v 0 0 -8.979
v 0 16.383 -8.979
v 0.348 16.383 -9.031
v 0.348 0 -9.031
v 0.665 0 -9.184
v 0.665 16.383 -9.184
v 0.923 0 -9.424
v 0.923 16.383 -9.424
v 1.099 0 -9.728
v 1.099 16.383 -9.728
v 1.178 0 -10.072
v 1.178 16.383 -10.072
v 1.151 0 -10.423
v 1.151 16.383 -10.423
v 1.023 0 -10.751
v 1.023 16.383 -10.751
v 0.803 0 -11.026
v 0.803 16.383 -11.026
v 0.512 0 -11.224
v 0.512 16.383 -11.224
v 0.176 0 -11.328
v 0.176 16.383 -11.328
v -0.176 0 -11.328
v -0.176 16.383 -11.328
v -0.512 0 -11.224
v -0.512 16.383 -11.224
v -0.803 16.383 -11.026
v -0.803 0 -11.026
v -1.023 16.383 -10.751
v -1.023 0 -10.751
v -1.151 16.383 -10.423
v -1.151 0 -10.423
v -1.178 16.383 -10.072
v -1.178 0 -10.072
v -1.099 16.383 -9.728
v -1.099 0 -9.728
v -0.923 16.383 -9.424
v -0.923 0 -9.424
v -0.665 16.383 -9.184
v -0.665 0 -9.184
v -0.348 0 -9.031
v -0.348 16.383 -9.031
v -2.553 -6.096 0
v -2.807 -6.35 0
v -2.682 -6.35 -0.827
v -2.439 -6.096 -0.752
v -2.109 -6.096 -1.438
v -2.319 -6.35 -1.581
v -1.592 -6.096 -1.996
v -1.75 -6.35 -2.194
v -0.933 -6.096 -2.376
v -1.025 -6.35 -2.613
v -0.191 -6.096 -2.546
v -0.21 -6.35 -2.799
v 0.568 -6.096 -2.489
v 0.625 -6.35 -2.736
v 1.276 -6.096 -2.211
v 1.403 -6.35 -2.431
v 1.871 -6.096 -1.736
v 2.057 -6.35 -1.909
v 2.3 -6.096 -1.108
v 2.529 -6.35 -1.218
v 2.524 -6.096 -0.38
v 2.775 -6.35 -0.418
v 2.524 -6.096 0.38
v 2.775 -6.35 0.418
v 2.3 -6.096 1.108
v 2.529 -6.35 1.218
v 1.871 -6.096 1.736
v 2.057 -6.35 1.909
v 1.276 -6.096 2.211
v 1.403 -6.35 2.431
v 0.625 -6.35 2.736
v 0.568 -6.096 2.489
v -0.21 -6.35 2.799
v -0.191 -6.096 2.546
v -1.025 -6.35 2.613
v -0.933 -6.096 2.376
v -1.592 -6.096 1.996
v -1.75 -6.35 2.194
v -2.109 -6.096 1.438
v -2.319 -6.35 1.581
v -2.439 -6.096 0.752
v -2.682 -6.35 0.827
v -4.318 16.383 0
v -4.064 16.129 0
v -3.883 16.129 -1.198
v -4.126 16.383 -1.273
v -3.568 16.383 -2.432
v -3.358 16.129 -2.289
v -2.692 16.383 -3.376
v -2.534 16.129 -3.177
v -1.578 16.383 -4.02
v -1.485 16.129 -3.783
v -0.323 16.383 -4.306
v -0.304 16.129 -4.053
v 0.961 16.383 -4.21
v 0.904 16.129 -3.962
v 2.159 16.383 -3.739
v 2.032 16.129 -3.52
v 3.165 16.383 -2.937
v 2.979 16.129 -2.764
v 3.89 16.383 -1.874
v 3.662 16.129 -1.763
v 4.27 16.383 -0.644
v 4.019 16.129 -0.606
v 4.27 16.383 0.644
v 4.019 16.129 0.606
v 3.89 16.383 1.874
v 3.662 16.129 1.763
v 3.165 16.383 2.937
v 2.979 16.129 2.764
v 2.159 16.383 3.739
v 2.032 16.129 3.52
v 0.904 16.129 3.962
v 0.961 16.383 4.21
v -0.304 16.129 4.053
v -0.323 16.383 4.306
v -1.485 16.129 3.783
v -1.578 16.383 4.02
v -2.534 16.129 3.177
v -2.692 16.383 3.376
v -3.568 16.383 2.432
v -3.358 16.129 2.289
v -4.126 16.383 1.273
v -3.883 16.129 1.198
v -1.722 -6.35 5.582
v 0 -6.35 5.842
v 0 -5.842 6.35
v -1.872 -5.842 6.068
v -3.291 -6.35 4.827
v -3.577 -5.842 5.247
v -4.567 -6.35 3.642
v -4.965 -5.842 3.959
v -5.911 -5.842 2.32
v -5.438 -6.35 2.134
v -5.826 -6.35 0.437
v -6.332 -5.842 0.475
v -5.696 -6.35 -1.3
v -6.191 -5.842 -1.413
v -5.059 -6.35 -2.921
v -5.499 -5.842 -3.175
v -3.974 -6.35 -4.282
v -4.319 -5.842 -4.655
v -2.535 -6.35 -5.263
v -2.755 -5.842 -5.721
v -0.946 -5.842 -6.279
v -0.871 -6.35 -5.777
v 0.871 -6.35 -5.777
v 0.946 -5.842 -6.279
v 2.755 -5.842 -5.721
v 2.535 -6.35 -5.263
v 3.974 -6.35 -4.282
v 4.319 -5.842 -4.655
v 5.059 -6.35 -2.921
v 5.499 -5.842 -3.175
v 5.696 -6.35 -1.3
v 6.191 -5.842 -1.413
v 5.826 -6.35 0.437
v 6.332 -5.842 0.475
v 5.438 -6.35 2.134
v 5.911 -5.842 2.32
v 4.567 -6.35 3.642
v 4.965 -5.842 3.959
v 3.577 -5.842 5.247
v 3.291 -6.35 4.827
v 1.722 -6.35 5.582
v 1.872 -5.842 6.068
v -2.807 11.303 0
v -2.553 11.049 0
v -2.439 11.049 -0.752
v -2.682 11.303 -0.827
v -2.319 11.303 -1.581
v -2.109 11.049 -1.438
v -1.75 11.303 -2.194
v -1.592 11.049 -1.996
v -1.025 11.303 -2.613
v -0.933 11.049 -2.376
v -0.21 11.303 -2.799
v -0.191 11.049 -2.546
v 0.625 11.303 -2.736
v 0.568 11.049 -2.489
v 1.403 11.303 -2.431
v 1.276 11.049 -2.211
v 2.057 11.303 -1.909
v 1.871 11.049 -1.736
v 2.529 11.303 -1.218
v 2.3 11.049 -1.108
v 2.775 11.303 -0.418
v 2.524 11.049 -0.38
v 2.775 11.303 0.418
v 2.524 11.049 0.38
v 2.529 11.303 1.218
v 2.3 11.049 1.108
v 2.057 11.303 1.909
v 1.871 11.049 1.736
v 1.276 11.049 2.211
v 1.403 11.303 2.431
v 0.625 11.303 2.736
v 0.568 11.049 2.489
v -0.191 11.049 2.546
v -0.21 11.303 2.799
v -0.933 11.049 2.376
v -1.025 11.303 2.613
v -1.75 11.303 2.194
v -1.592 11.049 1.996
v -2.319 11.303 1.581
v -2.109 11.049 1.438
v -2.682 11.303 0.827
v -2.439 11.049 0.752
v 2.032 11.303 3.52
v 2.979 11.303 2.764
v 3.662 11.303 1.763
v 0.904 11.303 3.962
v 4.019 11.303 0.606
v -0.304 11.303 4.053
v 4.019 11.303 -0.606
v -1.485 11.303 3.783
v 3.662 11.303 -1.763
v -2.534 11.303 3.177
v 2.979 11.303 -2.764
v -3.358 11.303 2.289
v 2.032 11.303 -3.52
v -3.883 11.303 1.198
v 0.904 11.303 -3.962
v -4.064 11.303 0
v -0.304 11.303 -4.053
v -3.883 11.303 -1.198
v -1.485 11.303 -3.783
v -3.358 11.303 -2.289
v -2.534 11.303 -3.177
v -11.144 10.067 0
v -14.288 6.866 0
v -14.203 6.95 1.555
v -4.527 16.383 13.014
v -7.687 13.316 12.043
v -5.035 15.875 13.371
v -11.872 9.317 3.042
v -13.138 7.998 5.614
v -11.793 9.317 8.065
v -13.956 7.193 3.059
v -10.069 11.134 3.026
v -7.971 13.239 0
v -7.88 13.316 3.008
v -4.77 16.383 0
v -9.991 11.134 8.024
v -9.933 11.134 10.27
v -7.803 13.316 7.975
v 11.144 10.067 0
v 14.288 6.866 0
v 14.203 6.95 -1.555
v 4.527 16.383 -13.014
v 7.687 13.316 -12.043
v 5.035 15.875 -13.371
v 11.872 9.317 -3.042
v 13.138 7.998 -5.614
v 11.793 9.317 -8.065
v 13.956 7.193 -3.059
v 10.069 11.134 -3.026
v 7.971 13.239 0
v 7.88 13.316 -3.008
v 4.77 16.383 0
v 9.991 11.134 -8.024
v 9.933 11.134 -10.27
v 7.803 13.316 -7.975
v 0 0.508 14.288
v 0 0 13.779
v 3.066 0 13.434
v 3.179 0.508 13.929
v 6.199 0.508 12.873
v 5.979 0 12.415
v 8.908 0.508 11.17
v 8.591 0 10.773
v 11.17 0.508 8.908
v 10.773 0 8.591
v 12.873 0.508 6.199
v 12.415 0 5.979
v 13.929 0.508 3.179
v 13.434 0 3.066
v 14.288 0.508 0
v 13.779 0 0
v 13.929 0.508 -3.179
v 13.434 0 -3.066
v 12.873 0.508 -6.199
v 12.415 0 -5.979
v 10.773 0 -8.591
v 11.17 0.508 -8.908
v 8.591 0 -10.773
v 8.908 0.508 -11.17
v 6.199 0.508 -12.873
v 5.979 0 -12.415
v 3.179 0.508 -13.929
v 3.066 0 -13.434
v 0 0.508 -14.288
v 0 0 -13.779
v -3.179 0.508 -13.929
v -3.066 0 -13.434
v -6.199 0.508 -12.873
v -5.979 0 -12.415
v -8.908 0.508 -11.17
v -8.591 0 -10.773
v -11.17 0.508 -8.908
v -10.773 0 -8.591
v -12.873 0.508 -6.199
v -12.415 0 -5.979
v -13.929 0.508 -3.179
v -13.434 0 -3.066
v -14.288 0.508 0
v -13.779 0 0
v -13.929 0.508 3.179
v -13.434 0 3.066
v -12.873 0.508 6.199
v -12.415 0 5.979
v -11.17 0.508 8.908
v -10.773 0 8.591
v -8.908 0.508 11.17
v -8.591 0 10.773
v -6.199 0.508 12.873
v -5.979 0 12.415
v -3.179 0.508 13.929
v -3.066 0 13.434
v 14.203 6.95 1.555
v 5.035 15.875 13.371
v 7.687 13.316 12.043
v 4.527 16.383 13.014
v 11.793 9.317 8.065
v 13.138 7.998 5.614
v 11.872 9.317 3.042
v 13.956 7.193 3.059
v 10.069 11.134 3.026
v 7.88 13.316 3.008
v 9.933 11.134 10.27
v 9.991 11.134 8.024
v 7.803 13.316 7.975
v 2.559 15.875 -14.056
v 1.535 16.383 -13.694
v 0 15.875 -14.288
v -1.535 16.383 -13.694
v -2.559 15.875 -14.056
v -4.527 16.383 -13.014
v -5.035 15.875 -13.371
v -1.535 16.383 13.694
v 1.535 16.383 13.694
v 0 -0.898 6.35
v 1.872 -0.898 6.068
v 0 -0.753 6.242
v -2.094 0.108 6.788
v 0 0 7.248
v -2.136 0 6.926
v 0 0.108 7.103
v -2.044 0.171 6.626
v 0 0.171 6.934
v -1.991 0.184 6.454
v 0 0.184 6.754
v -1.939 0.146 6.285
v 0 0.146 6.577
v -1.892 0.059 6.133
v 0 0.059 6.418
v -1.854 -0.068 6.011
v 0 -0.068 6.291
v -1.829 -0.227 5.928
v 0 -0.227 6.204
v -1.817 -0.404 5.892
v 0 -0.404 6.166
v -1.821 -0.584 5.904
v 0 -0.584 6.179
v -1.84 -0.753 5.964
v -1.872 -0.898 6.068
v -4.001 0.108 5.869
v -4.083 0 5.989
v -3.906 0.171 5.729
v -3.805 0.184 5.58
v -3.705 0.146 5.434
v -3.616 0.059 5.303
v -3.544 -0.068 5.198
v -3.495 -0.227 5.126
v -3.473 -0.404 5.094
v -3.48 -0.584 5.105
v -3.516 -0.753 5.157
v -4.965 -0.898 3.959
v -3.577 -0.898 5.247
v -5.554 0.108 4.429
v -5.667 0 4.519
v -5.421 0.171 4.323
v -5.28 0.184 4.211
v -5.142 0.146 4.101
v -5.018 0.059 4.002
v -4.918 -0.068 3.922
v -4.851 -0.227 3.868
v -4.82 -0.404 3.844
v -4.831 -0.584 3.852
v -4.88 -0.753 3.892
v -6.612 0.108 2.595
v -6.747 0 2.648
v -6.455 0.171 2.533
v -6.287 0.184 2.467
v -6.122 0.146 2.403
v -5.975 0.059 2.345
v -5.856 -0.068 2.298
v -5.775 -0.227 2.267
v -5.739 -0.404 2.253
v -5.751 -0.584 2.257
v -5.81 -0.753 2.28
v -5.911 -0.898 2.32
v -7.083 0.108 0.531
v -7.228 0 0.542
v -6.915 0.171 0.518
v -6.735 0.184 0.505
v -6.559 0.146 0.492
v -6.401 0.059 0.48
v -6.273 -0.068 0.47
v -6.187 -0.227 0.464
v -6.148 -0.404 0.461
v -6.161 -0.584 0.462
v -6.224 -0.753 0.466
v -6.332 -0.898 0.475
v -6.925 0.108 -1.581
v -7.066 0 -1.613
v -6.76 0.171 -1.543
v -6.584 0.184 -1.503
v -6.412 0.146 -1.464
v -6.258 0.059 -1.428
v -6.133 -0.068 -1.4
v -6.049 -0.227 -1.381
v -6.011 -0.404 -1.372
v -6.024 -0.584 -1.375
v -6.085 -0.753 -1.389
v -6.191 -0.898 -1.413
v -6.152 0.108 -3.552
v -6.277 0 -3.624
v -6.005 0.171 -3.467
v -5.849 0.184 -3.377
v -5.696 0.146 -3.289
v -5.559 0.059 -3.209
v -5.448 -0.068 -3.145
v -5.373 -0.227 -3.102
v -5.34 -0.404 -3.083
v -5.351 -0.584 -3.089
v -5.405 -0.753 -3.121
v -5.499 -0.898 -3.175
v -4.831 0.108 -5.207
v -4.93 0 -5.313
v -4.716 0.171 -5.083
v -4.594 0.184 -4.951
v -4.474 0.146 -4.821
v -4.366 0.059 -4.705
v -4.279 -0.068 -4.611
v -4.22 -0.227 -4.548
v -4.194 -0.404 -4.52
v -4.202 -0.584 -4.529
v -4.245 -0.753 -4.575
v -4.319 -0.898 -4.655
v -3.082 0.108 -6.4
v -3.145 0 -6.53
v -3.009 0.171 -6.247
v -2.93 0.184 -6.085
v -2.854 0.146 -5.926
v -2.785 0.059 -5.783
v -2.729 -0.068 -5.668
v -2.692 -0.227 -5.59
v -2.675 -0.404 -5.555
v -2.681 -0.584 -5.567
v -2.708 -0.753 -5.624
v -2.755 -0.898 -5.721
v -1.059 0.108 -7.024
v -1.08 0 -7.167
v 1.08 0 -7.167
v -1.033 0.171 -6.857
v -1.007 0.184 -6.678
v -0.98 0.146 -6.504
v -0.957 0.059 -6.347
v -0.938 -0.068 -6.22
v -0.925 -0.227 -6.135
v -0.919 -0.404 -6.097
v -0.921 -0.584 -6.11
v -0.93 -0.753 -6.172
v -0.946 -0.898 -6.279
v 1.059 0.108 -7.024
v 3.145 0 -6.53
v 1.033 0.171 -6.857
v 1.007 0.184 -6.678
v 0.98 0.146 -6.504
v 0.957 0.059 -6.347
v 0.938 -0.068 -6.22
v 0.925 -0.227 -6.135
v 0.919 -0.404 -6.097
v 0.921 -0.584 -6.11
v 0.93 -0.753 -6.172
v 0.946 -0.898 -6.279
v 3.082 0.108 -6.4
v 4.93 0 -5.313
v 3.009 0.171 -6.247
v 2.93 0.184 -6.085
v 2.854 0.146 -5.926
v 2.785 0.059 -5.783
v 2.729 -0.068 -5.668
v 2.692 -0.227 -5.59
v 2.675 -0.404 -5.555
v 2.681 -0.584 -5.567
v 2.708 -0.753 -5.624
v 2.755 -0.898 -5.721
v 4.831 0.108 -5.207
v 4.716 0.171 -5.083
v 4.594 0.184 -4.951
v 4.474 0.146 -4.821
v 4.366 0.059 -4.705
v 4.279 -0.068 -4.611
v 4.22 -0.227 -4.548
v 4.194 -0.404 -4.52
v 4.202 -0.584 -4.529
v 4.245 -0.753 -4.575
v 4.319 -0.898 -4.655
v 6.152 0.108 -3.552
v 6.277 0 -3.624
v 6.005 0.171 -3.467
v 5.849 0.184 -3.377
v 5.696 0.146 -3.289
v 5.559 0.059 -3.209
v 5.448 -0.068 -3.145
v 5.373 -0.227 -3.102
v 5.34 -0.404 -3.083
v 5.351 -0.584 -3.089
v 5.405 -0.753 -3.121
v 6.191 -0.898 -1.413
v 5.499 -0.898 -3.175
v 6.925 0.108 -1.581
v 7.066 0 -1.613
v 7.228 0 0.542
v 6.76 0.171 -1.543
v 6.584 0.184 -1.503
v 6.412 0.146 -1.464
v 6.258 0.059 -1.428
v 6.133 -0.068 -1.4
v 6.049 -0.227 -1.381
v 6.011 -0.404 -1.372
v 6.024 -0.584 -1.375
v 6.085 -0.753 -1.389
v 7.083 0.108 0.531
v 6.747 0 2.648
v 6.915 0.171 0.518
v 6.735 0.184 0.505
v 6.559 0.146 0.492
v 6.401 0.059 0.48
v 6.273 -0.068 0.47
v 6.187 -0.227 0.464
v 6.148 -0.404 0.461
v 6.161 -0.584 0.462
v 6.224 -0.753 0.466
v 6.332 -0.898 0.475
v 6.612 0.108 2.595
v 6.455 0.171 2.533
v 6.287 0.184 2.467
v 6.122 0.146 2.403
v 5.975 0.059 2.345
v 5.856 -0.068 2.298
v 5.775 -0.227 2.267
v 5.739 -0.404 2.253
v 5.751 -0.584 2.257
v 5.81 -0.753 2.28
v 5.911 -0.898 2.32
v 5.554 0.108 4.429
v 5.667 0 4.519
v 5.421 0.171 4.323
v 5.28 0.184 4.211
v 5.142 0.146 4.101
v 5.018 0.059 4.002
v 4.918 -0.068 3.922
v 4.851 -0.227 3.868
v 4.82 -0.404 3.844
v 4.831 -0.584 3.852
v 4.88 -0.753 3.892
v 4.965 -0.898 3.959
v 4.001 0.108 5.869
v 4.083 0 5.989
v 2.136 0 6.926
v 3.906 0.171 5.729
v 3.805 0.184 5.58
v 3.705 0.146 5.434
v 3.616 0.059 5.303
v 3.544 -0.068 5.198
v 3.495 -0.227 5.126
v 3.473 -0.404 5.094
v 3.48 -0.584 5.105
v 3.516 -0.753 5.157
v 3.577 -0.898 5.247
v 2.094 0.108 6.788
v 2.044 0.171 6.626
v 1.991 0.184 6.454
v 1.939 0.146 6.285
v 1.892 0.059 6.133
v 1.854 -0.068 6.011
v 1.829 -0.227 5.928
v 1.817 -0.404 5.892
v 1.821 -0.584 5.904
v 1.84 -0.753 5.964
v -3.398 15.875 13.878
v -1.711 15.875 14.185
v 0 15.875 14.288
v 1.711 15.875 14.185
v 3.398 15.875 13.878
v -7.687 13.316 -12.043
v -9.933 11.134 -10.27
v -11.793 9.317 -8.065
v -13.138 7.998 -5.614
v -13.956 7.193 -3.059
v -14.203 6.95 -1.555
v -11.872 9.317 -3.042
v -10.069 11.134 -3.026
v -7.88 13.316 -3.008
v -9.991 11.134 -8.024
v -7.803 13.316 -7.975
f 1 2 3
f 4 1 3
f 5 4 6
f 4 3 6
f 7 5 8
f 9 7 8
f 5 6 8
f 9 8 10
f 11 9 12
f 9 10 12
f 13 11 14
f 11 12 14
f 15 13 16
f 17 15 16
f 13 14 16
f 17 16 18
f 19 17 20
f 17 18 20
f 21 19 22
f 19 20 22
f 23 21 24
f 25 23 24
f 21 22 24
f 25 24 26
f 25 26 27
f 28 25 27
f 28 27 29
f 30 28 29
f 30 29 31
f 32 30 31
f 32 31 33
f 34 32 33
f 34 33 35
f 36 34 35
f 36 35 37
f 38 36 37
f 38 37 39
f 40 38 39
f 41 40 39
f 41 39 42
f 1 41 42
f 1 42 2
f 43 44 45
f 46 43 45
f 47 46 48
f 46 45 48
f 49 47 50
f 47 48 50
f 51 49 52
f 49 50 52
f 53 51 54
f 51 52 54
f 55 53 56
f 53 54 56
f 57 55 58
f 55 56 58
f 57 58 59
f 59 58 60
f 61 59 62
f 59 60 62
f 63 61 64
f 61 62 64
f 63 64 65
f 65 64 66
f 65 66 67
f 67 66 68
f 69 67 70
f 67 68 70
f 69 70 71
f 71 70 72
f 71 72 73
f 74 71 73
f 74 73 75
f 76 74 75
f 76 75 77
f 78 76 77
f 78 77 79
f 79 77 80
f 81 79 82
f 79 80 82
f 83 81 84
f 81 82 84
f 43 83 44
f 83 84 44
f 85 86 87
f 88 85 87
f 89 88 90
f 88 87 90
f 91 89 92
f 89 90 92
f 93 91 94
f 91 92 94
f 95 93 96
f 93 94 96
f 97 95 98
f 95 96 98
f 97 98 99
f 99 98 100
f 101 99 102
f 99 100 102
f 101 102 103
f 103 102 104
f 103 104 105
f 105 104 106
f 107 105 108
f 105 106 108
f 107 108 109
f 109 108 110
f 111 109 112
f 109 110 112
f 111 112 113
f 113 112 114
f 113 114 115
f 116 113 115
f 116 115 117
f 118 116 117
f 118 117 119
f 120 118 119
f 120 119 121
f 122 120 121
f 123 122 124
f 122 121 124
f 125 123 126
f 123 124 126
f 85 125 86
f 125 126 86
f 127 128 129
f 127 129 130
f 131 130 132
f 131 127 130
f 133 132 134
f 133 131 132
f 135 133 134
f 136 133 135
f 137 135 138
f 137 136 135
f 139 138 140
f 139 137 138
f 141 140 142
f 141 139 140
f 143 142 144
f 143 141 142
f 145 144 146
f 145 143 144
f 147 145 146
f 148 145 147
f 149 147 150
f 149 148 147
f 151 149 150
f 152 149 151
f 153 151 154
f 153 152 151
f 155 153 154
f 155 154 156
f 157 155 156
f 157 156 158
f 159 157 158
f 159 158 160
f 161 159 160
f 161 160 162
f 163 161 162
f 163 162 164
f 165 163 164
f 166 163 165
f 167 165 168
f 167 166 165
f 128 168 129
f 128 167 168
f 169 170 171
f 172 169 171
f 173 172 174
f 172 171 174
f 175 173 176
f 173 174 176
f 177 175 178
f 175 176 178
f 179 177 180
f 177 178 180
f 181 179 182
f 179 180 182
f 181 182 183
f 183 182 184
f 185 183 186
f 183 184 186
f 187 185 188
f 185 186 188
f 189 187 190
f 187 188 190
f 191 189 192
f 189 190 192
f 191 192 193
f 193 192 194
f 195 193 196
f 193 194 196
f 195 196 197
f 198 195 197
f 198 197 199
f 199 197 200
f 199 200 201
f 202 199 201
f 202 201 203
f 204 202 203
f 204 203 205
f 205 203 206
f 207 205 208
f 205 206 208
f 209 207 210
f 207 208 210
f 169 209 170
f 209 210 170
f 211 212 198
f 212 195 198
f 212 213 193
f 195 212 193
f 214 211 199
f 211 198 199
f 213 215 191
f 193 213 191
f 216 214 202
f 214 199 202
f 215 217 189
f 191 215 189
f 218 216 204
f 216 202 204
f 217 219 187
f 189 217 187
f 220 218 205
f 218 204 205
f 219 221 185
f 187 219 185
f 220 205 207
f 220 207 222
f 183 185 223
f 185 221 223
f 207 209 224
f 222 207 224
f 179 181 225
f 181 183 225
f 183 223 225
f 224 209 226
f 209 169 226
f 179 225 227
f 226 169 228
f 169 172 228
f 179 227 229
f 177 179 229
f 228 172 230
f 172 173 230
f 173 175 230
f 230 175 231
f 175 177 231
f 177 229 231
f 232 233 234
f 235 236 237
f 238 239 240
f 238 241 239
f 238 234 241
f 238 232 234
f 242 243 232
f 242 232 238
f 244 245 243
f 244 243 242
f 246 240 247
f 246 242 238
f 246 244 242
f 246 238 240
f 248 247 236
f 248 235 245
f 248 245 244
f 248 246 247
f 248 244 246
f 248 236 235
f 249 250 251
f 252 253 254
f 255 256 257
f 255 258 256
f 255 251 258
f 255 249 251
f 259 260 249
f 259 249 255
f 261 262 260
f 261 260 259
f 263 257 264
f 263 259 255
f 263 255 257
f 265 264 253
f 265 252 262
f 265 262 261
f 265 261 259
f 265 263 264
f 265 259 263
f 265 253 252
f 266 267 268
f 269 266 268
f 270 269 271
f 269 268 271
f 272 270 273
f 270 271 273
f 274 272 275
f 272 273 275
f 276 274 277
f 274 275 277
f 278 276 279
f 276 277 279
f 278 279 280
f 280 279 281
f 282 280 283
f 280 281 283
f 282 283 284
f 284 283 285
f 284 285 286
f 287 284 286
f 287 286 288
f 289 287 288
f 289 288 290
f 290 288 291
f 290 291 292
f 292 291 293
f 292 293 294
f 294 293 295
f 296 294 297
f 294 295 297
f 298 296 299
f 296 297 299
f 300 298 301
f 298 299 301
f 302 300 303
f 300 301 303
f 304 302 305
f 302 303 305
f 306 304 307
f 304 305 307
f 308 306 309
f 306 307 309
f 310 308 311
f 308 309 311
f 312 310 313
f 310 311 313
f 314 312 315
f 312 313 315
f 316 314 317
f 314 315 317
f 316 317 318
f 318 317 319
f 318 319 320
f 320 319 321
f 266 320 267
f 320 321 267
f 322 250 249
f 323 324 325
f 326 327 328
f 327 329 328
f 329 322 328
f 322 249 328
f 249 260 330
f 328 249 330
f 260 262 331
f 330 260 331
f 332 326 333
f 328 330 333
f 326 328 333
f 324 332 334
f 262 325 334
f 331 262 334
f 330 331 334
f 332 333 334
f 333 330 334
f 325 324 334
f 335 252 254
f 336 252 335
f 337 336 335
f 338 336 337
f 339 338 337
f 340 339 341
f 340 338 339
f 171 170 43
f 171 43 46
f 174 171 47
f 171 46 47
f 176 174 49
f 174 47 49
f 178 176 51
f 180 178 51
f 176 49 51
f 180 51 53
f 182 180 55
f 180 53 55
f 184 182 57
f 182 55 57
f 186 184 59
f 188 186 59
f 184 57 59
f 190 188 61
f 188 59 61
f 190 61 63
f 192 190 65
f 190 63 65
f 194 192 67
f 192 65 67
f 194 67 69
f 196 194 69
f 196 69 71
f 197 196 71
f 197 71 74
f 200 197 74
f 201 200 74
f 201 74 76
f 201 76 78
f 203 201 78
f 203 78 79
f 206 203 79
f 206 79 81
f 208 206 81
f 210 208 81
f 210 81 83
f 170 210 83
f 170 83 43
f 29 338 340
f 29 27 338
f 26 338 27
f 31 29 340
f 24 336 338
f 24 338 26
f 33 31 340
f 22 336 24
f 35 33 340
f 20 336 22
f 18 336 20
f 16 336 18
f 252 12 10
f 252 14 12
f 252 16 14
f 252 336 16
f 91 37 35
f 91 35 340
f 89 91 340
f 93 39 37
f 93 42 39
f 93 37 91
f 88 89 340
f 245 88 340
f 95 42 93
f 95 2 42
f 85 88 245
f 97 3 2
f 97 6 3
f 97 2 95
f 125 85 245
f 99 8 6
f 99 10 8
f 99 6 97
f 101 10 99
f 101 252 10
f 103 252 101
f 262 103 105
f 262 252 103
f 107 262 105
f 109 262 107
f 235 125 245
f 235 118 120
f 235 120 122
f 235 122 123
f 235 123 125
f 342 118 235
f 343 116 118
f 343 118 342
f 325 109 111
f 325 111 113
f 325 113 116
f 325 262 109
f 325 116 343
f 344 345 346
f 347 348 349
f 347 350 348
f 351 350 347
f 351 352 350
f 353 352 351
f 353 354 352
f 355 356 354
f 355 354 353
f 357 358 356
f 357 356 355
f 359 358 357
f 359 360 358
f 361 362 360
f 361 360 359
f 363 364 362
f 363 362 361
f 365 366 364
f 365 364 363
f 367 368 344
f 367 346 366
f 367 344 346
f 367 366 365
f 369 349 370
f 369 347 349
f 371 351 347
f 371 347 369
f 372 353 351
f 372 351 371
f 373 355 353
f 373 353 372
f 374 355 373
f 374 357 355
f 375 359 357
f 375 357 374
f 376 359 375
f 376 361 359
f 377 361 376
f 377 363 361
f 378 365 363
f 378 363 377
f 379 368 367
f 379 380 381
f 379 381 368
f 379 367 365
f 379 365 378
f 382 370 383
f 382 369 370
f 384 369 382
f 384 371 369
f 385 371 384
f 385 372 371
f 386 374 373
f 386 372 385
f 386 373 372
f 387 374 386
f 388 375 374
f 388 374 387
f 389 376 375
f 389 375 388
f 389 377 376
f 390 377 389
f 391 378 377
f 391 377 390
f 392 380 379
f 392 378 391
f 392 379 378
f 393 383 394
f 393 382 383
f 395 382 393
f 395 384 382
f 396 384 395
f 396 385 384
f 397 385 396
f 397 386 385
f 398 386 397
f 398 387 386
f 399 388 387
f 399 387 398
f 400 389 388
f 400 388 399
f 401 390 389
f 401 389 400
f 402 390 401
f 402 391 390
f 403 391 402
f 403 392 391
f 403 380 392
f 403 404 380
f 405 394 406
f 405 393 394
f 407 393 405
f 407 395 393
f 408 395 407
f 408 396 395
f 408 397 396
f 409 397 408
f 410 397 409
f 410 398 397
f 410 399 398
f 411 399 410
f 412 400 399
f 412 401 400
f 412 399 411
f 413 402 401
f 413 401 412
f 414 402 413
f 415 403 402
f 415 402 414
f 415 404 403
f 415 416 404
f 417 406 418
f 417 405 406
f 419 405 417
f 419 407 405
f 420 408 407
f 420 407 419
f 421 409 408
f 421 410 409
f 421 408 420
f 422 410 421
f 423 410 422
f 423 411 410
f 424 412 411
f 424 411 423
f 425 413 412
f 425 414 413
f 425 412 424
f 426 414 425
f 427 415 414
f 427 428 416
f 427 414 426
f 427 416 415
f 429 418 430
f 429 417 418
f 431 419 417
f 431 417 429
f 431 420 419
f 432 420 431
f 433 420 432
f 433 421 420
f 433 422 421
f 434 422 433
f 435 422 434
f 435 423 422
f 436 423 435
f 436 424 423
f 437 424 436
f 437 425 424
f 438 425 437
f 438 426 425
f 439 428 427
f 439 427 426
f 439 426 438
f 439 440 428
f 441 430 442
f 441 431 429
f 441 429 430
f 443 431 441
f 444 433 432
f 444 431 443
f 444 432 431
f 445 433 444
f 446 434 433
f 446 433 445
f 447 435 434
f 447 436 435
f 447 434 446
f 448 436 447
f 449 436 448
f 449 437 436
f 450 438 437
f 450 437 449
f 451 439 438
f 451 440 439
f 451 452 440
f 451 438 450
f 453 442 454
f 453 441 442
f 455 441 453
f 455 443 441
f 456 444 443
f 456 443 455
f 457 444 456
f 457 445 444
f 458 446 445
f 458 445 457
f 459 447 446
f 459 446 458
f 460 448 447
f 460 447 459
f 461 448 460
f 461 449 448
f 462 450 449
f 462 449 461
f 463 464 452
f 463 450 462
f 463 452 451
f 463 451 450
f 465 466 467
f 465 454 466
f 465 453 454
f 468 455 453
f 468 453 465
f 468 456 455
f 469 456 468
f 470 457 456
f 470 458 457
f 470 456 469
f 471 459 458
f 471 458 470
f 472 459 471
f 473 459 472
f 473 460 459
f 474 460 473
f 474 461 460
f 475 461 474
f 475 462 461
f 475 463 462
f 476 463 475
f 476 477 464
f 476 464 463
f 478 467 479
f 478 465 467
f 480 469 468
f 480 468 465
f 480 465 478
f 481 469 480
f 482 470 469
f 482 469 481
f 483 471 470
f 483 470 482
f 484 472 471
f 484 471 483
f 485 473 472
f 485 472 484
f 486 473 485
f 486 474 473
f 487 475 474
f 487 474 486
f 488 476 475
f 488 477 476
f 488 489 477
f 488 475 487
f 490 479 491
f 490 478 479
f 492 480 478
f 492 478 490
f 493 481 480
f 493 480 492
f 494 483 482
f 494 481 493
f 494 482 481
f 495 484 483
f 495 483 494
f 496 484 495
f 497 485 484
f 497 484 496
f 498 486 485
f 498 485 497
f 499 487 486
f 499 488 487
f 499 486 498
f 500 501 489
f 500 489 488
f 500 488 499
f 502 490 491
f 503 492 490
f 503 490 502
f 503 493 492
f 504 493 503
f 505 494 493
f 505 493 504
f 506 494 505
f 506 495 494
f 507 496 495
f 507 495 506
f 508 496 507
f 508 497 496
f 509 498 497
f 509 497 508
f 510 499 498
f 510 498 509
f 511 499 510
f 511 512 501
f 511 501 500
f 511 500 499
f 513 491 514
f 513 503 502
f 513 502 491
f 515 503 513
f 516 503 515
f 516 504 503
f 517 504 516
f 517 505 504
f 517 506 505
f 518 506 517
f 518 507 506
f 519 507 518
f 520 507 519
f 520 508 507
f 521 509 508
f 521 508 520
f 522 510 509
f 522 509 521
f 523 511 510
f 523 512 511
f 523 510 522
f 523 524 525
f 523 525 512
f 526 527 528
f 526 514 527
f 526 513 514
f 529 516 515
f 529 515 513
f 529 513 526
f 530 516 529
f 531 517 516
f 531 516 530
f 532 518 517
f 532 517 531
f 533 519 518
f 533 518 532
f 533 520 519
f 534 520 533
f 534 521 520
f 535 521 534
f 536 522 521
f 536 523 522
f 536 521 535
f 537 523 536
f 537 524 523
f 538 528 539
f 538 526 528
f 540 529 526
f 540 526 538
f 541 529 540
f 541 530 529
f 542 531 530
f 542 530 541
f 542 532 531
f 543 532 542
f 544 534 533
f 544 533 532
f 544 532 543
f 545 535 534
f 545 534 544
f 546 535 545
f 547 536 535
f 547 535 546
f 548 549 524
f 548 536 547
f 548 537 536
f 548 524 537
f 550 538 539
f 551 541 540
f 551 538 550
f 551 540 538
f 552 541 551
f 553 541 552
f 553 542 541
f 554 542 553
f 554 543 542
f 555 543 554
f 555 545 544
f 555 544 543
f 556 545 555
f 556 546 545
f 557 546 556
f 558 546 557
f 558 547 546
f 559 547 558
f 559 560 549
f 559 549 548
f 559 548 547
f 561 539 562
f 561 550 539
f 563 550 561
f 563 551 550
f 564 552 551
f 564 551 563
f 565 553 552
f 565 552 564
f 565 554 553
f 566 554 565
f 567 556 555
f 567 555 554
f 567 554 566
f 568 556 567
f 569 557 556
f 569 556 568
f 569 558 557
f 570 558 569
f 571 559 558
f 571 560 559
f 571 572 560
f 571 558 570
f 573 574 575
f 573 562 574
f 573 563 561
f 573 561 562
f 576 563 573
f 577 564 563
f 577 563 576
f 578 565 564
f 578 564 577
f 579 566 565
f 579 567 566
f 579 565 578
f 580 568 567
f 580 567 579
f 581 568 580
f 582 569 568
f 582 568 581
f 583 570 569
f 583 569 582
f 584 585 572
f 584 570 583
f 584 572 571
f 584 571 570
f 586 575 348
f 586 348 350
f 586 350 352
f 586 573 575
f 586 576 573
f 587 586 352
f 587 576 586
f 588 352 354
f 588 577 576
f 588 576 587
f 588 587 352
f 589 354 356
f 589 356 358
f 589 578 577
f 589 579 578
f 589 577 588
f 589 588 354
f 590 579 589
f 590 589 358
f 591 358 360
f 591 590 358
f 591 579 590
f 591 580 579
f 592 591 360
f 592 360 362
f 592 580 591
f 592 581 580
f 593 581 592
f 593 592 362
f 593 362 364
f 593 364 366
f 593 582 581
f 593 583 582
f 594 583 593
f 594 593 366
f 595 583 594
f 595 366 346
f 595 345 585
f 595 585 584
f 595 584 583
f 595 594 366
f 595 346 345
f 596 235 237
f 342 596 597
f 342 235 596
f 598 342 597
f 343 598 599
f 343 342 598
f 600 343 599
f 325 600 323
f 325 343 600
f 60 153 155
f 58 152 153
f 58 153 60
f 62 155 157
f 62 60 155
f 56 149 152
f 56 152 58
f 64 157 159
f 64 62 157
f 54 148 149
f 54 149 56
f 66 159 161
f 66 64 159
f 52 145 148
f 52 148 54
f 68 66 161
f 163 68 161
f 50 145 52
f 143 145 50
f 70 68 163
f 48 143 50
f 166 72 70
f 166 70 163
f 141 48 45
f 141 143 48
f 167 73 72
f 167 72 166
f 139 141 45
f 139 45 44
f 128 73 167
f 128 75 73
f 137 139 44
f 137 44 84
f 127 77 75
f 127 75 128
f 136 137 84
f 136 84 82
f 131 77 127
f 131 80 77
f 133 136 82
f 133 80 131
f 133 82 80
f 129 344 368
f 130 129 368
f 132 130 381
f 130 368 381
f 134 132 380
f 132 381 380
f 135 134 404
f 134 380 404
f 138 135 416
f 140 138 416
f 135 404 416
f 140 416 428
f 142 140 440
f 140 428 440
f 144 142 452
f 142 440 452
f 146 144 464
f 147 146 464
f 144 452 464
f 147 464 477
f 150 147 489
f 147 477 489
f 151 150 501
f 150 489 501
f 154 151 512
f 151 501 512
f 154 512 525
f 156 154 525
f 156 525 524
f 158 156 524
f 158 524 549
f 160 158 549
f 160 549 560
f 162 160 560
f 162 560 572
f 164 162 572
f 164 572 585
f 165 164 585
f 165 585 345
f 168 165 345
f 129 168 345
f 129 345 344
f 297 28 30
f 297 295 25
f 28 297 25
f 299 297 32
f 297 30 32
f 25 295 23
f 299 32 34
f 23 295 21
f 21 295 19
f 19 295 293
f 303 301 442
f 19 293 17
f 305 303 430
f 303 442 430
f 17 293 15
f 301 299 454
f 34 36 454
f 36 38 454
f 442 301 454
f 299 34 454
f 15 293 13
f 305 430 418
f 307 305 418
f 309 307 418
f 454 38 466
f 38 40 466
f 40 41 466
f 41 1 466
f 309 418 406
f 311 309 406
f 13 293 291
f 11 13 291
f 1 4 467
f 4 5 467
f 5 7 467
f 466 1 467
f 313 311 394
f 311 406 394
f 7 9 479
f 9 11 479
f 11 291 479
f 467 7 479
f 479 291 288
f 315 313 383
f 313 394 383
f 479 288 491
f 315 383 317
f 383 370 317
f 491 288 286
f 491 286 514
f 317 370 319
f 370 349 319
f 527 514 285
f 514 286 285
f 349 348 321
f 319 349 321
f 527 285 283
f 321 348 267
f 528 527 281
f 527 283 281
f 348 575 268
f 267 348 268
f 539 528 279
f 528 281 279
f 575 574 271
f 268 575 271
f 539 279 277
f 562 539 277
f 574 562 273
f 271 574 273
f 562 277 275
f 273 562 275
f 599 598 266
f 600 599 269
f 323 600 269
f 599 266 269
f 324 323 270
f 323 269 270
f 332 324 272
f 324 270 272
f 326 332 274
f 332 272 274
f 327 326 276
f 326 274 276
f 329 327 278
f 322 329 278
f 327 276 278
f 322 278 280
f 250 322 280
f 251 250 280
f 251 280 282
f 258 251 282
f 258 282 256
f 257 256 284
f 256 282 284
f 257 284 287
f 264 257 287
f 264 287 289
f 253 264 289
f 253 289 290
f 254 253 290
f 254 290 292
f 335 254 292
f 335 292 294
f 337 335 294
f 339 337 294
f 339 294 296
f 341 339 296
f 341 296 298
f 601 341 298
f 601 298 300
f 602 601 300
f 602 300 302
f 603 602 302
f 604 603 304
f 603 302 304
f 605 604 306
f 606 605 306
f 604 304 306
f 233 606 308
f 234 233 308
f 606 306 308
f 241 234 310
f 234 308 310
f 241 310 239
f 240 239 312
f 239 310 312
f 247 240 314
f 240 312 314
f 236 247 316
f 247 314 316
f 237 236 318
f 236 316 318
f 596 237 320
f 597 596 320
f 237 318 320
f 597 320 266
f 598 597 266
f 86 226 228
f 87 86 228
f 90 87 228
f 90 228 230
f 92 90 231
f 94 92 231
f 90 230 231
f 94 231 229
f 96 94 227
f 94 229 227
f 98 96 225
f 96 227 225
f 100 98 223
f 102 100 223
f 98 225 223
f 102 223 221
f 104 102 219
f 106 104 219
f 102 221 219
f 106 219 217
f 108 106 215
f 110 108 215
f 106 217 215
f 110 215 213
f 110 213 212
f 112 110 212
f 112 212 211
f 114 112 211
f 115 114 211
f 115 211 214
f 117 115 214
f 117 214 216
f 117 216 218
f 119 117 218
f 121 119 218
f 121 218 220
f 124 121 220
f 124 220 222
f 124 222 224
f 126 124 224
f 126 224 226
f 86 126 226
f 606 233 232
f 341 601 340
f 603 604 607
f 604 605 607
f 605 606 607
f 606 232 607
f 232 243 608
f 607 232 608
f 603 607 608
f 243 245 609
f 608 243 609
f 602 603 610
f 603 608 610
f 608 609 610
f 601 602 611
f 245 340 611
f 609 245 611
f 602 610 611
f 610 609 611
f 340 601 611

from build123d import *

# Parameters (mm, degrees)
SKETCH1_R               = 14.2875
BOSS_EXTRUDE1_DEPTH     = 16.383
SKETCH2_R               = 6.35
BOSS_EXTRUDE2_DEPTH     = 6.35
SKETCH4_R               = 1.1811
CUT_EXTRUDE1_DEPTH      = 23.733
CHAMFER1_SIZE           = 0.508
CUT_EXTRUDE2_DEPTH      = 18.923
CUT_REVOLVE1_ANGLE      = 5
SKETCH7_R               = 0.635
F_1_4_20_TAPPED_HOLE1_D = 5.1054
HOLE1_D                 = 8.128
HOLE1_DEPTH             = 5.08
CHAMFER2_SIZE           = 0.254


with BuildPart() as part:
    # Sketch1 → Boss-Extrude1 (new body)
    with BuildSketch(Plane(origin=(0, 0, 0), x_dir=(1, 0, 0), z_dir=(0, 1, 0))):
        with Locations(Location((0, 0, 0), (0, 0, 270))):  # turned: the seam where the file's is
            Circle(SKETCH1_R)
    extrude(amount=BOSS_EXTRUDE1_DEPTH)

    # Sketch2 → Boss-Extrude2 (add)
    with BuildSketch(Plane.XZ):
        with Locations(Location((0, 0, 0), (0, 0, 90))):  # turned: the seam where the file's is
            Circle(SKETCH2_R)
    extrude(amount=BOSS_EXTRUDE2_DEPTH)

    # Sketch4 → Cut-Extrude1 (cut, through all)
    with BuildSketch(Plane(origin=(0, 16.383, 0), x_dir=(1, 0, 0), z_dir=(0, 1, 0))):
        with Locations(Location((0, 10.16, 0), (0, 0, 270))):  # turned: the seam where the file's is
            Circle(SKETCH4_R)
    extrude(amount=-CUT_EXTRUDE1_DEPTH, mode=Mode.SUBTRACT)

    # Chamfer1
    chamfer1_edges = [part.edges().sort_by_distance(p)[0] for p in [
        (0, 0, -14.2875),
        (0, 16.383, -14.2875),
        (0, -6.35, -6.35),
    ]]
    chamfer(chamfer1_edges, length=CHAMFER1_SIZE)

    # Sketch5 → Cut-Extrude2 (cut, symmetric)
    with BuildSketch(Plane.XY):
        Polygon((-2.548384182, 18.669), (-16.088719044, 5.128665138), (-16.088719044, 23.827435377), (16.088719044, 23.827435377), (16.088719044, 5.128665138), (2.548384182, 18.669), align=None)
    extrude(amount=CUT_EXTRUDE2_DEPTH, both=True, mode=Mode.SUBTRACT)

    # Sketch6 → Cut-Revolve1 (revolve, symmetric, cut)
    with BuildSketch(Plane.XY) as cut_revolve1_sk:
        with BuildLine():
            Line((0.60449584, 21.537658497), (-20.777423288, 21.537658497))
            Line((-20.777423288, 21.537658497), (-20.777423288, 0.072260804))
            ThreePointArc((-20.777423288, 0.072260804), (-10.249089347, 10.966952825), (0.60449584, 21.537658497))
        make_face()
    cut_revolve1 = revolve(axis=Axis((343.991741396, -341.896241396, 0), (0, 1, 0)), revolution_arc=CUT_REVOLVE1_ANGLE / 2, mode=Mode.SUBTRACT)
    cut_revolve1 = cut_revolve1 + revolve(cut_revolve1_sk.sketch, axis=Axis((343.991741396, -341.896241396, 0), (0, -1, 0)), revolution_arc=CUT_REVOLVE1_ANGLE / 2, mode=Mode.SUBTRACT)

    # Mirror1: Cut-Revolve1 across plane
    add(cut_revolve1.mirror(Plane(origin=(0, 0, 0), x_dir=(0, 0, 1), z_dir=(1, 0, 0))), mode=Mode.SUBTRACT)

    # Sketch7 → Cut-Revolve2 (revolve, cut)
    with BuildSketch(Plane.XY, mode=Mode.PRIVATE) as cut_revolve2_sk:
        with Locations((6.799012806, -0.449012806)):
            Circle(SKETCH7_R)
    revolve(cut_revolve2_sk.sketch.rotate(Axis((0, 16.383, 0), (0, -1, 0)), 90), axis=Axis((0, 16.383, 0), (0, -1, 0)), mode=Mode.SUBTRACT)  # turned: the seam where the file's is

    # 1/4-20 Tapped Hole1 (through all)
    with Locations(Plane(origin=(0, 16.383, 0), x_dir=(1, 0, 0), z_dir=(0, 1, 0))):
        with Locations((0, 0)):
            Hole(F_1_4_20_TAPPED_HOLE1_D / 2)

    # Hole1
    with Locations(Plane(origin=(0, 16.383, 0), x_dir=(1, 0, 0), z_dir=(0, 1, 0))):
        with Locations((0, 0)):
            Hole(HOLE1_D / 2, depth=HOLE1_DEPTH)

    # Chamfer2
    chamfer2_edges = [part.edges().sort_by_distance(p)[0] for p in [
        (2.5527, -6.35, 0),
        (2.5527, 11.303, 0),
        (4.064, 16.383, 0),
    ]]
    chamfer(chamfer2_edges, length=CHAMFER2_SIZE)


solid = part.part
